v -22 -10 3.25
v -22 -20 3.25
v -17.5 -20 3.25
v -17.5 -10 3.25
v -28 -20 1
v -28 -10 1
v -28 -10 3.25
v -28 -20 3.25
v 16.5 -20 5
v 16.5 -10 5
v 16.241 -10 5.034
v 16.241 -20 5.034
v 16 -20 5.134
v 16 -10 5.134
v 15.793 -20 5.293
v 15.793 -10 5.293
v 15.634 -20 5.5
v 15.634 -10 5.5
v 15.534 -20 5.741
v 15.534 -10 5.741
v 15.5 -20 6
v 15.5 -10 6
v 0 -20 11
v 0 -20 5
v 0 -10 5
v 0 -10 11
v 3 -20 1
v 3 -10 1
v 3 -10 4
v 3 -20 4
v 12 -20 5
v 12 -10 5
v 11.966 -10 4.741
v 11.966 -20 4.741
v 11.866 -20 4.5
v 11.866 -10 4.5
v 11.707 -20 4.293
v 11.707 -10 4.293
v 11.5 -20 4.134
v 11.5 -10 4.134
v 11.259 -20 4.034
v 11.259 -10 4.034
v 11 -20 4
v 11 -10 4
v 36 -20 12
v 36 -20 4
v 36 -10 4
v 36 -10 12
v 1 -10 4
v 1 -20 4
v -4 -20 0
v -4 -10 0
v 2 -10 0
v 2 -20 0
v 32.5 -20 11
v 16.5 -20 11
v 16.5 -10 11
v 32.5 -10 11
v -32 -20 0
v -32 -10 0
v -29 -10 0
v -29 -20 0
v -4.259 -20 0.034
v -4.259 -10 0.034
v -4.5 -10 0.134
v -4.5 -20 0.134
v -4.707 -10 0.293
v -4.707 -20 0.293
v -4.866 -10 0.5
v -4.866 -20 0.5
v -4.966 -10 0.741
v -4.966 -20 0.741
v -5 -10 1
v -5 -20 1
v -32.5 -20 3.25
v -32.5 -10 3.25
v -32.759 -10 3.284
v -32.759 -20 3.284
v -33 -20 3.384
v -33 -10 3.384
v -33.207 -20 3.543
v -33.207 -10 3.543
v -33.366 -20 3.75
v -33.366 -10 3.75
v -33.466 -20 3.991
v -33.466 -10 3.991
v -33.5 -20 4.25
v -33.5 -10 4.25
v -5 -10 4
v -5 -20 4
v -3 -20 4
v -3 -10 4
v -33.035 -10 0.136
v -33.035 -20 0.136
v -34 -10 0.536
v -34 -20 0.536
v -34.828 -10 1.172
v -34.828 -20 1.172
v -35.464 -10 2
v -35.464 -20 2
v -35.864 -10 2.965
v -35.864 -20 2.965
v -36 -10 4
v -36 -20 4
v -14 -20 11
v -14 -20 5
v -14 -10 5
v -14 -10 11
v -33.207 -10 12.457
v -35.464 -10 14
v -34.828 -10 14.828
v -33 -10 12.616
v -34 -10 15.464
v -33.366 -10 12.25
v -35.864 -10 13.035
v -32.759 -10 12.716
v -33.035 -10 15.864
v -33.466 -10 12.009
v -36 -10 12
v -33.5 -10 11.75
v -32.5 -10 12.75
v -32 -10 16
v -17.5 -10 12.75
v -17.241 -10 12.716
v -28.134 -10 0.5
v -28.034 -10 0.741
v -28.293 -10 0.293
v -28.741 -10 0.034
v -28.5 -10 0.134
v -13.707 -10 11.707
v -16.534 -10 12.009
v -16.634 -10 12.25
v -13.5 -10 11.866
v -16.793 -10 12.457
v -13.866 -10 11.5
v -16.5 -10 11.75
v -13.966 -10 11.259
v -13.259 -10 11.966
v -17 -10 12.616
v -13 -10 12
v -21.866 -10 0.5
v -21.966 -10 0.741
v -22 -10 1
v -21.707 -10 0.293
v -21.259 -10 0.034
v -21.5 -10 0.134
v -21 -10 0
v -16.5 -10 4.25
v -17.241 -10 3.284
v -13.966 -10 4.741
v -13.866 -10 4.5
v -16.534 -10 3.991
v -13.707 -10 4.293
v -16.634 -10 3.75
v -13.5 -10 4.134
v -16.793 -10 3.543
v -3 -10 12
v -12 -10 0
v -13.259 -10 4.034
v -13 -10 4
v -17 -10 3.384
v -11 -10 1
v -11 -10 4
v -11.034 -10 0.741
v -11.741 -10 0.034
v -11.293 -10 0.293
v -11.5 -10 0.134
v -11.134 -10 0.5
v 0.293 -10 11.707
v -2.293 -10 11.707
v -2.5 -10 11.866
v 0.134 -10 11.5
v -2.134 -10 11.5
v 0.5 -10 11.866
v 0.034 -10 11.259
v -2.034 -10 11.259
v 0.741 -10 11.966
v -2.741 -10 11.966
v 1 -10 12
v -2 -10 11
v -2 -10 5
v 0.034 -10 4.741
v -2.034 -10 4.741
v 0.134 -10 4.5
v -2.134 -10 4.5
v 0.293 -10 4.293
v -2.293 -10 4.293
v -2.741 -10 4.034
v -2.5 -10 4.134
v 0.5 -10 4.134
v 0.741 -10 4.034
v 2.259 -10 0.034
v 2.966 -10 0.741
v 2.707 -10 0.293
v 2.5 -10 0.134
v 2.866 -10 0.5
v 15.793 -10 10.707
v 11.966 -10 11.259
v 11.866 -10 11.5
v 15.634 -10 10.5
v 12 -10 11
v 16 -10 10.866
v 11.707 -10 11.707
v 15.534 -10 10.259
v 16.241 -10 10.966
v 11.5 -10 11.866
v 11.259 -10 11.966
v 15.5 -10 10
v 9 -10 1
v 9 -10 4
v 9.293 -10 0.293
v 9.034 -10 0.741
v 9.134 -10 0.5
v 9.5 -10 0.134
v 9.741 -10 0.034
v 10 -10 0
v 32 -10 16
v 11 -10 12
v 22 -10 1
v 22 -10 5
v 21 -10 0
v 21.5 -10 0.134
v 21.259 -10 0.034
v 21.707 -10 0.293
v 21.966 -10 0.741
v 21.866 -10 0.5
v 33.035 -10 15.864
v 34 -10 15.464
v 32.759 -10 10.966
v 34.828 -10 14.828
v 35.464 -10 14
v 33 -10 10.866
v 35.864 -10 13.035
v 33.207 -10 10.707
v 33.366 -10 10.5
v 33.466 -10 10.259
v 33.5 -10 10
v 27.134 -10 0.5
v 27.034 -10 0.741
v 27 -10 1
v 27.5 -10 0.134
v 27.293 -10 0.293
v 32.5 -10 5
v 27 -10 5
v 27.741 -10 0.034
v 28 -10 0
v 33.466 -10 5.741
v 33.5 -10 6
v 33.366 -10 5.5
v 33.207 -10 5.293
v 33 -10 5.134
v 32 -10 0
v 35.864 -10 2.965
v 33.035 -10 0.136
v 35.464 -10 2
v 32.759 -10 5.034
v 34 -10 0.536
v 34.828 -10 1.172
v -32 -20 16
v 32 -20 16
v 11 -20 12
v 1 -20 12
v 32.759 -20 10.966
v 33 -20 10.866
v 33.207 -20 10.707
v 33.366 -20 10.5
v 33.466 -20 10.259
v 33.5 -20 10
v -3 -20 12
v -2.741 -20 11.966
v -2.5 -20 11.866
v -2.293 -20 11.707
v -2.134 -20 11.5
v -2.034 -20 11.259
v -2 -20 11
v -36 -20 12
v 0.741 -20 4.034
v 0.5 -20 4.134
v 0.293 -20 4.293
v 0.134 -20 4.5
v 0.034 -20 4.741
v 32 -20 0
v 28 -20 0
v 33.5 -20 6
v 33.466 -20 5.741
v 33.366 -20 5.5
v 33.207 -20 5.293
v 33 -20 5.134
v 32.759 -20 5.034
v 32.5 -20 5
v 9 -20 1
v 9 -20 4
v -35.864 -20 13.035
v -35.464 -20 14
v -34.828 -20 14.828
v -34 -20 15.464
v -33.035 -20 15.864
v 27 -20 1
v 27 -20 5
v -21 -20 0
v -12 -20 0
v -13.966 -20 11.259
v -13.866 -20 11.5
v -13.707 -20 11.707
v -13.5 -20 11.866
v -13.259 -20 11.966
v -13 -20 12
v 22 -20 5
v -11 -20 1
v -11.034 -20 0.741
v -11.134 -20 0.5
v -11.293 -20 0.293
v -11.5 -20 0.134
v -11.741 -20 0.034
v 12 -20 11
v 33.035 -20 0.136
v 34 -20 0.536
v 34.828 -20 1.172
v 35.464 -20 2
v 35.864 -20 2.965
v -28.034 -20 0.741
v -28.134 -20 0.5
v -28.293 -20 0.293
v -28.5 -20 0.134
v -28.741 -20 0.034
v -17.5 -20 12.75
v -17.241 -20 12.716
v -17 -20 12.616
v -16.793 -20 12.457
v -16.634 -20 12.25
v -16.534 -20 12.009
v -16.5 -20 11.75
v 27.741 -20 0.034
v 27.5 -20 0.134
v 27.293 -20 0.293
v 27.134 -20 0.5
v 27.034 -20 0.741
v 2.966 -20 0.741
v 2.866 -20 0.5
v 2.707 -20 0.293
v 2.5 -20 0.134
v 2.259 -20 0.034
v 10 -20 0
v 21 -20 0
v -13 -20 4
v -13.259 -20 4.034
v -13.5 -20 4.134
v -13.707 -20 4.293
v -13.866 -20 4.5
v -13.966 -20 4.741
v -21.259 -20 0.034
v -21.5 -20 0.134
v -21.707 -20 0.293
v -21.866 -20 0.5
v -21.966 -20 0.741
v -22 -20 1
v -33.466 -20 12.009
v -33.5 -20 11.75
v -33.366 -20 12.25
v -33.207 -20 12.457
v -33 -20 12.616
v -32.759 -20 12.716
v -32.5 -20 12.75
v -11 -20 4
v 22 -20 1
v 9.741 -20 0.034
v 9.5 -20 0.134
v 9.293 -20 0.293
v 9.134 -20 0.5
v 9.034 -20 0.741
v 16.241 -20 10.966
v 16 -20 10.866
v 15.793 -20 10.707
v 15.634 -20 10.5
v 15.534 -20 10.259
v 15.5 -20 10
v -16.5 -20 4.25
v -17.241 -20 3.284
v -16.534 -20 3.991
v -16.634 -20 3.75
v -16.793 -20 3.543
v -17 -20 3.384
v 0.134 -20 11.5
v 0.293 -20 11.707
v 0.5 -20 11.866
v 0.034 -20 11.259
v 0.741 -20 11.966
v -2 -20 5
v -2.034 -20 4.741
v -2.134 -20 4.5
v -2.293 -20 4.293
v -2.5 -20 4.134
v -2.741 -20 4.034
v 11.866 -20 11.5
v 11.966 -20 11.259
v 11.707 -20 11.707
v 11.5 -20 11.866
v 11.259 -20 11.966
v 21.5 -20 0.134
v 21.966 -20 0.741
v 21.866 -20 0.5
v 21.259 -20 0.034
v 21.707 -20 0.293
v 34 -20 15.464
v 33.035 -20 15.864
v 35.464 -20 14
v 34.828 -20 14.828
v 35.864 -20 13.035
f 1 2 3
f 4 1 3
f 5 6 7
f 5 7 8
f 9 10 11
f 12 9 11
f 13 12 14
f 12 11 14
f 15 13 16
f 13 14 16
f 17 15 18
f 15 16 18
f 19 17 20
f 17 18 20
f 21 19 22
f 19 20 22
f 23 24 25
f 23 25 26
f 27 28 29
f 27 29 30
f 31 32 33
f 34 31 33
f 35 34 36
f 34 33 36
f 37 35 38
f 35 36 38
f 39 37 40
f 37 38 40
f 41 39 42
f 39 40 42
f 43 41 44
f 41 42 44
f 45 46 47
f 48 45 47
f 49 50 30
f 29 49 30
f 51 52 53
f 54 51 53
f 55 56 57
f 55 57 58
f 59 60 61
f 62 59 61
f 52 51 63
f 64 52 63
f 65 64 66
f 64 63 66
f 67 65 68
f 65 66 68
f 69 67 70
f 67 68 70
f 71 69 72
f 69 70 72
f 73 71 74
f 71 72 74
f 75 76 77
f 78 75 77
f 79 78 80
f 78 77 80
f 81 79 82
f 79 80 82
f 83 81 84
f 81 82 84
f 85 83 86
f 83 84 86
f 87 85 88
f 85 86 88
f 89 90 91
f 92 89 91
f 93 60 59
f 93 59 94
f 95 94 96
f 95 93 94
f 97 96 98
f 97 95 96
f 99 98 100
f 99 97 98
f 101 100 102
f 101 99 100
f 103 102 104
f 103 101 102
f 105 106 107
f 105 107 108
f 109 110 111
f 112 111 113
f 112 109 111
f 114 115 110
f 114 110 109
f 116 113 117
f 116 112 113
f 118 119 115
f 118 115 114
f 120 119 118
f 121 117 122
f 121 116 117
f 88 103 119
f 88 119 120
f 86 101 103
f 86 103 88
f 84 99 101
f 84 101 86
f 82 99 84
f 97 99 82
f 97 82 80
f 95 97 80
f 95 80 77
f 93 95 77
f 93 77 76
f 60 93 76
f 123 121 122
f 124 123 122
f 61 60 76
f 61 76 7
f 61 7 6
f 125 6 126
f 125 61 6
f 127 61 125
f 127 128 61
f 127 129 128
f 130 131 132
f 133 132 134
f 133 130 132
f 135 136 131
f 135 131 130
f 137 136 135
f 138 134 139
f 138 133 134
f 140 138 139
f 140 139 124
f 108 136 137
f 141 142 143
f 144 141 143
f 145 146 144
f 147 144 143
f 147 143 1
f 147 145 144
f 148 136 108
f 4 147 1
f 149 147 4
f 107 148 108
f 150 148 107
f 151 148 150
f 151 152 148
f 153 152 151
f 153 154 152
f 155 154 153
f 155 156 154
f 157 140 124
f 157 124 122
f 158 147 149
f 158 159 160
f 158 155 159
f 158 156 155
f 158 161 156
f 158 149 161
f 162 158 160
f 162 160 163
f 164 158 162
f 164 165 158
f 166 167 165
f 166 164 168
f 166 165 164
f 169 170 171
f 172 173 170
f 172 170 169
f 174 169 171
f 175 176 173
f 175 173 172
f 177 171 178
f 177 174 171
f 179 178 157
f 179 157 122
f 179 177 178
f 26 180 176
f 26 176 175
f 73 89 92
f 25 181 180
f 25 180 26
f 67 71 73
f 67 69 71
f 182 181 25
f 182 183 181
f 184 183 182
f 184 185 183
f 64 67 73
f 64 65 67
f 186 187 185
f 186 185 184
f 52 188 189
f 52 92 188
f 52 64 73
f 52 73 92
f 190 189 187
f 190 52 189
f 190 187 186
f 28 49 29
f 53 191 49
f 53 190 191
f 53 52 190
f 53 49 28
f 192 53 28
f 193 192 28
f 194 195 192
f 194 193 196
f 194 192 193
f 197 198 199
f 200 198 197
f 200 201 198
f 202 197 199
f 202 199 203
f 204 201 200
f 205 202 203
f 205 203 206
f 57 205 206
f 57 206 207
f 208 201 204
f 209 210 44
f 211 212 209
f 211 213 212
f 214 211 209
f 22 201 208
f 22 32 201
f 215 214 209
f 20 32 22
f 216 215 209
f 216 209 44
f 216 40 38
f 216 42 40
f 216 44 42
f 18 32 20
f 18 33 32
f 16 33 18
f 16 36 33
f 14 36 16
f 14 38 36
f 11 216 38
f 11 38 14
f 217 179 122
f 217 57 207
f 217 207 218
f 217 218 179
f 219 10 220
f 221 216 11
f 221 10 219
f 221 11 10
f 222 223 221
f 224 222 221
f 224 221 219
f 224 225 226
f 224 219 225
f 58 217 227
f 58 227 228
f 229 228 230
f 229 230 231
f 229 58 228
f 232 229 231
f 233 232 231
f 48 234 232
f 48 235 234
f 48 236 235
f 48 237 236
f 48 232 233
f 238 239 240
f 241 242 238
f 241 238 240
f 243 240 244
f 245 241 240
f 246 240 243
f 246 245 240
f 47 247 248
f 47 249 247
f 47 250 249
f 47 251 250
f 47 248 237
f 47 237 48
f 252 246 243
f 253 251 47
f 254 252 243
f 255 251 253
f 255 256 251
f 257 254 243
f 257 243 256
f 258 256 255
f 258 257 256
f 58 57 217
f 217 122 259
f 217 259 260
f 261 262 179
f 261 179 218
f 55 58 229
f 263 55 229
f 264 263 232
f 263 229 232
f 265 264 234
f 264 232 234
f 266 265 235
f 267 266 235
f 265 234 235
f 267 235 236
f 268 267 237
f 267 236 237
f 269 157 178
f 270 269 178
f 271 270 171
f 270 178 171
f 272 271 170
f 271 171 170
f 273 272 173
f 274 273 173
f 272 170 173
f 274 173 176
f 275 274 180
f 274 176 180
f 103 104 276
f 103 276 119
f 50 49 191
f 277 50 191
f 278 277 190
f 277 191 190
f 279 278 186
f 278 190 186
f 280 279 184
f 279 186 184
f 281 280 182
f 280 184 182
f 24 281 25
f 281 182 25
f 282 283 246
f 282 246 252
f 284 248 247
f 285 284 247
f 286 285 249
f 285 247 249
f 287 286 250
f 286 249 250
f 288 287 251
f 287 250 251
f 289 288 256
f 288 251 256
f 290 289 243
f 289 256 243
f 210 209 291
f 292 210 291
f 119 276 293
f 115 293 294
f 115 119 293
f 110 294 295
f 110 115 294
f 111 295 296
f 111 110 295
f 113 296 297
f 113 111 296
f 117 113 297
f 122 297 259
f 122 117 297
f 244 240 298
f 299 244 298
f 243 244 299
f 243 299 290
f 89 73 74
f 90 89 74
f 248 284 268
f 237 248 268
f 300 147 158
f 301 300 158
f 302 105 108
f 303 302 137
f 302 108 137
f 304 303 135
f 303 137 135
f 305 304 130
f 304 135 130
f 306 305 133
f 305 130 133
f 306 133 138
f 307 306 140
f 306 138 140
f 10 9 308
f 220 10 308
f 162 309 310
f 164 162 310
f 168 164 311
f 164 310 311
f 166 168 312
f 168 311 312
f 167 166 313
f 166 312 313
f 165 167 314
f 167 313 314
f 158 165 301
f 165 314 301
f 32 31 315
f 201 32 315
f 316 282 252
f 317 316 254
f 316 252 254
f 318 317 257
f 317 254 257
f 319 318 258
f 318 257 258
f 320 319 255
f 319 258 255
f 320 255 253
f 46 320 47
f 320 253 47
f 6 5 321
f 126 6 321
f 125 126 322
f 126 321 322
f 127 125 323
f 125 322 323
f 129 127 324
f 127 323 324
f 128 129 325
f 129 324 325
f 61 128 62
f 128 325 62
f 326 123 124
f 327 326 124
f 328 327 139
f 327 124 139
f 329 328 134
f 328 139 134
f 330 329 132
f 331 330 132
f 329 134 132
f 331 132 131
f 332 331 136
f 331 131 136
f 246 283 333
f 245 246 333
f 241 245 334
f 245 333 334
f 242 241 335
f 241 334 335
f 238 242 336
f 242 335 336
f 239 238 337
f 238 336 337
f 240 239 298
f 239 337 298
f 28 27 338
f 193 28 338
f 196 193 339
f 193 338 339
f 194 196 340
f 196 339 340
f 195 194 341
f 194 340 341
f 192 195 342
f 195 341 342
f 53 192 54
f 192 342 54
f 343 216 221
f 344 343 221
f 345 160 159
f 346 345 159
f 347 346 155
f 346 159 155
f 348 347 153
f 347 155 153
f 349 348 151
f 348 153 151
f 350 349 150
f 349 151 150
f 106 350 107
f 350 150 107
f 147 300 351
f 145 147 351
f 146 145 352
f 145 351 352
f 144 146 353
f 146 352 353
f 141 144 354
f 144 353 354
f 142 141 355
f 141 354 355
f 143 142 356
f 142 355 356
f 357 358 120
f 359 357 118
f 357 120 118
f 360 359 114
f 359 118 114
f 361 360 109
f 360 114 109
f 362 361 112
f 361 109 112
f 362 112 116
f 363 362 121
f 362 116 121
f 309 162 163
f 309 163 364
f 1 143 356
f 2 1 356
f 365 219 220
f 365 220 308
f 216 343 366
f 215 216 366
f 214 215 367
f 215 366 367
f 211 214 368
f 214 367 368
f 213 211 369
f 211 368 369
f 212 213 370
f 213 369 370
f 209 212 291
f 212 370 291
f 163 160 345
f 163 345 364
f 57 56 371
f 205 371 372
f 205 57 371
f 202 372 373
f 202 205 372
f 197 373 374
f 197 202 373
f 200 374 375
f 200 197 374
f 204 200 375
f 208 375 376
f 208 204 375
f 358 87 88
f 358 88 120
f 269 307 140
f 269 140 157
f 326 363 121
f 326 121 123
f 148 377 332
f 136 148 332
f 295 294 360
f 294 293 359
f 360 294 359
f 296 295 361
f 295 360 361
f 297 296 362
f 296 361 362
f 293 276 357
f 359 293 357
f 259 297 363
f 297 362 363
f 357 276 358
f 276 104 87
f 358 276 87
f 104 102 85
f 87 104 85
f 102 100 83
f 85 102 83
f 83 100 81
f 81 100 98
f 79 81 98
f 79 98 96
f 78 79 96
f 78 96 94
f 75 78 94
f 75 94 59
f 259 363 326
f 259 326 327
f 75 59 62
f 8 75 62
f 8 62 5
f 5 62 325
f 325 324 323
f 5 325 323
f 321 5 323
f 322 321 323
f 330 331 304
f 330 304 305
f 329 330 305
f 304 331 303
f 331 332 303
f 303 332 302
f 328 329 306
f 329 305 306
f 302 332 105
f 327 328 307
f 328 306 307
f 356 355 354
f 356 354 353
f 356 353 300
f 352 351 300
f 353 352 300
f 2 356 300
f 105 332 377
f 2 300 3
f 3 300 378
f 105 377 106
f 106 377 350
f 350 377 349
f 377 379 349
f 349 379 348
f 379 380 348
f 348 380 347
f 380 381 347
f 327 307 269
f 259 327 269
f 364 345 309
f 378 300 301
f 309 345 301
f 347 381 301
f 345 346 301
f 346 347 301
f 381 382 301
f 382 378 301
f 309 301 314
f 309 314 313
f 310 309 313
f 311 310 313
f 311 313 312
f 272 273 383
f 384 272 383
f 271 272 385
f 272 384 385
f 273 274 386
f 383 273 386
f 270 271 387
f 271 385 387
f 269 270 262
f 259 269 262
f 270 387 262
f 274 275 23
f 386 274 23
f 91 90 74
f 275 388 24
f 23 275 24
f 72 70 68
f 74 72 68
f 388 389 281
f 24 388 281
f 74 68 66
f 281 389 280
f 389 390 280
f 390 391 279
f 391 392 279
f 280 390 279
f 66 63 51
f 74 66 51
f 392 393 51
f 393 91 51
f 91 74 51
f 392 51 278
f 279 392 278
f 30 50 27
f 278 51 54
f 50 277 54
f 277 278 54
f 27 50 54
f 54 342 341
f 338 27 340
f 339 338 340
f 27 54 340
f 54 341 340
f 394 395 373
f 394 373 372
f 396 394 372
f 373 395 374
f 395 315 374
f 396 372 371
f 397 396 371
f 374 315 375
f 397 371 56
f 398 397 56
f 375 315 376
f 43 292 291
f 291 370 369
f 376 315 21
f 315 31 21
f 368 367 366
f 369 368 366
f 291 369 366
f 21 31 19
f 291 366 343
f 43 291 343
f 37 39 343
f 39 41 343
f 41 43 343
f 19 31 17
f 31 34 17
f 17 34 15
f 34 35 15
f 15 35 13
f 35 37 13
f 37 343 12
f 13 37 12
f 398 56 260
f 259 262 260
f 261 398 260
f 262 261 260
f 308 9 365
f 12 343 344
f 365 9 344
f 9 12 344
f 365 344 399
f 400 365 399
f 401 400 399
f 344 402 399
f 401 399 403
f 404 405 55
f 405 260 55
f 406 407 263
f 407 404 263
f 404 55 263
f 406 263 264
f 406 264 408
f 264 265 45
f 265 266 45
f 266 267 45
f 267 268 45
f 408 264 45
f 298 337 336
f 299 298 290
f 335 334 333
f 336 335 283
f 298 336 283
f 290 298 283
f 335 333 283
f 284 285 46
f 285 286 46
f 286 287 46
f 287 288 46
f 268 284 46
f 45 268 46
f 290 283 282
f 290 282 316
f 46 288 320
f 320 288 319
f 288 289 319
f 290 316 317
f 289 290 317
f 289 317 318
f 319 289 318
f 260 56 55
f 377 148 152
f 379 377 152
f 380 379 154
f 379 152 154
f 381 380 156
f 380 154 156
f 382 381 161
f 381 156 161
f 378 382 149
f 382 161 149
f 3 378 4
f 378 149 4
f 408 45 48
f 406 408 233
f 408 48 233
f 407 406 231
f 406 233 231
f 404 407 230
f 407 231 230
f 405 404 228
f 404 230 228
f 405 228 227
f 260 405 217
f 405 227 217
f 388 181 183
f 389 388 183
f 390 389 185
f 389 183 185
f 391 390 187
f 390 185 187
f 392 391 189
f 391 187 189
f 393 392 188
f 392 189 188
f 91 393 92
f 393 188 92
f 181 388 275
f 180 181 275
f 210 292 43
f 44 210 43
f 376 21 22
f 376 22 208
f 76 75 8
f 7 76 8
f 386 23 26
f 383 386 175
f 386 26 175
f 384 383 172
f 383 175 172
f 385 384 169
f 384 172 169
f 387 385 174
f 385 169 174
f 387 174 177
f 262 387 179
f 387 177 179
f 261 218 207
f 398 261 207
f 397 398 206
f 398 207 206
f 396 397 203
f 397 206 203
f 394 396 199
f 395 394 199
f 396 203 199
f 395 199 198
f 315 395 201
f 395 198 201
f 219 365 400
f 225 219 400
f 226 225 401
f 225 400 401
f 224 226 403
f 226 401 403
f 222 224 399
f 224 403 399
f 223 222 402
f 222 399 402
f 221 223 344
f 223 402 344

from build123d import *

# Parameters (mm, degrees)
F0_W      = 72
F0_H      = 40
F1_DEPTH  = 16
F3_W      = 17
F3_H      = 9.5
F7_DEPTH  = 35
F4_W      = 12
F4_H      = 8
F8_DEPTH  = 20
F5_W      = 12
F5_H      = 8
F9_DEPTH  = 28
F6_W      = 18
F6_H      = 6
F10_DEPTH = 11
F11_R     = 3.25
F11_R_2   = 3
F12_DEPTH = 40.001
F13_W     = 6
F13_H     = 40
F13_W_2   = 5
F14_DEPTH = 8
F15_R     = 1
F16_R     = 4
F17_W     = 72
F17_H     = 10
F18_DEPTH = 16.001


with BuildPart() as f1:
    # F0 (on Top) → F1 (new body)
    with BuildSketch(Plane.XY):
        Rectangle(F0_W, F0_H)
    extrude(amount=F1_DEPTH)

    # F3 (on face) → F7 (cut)
    with BuildSketch(Plane.XZ.offset(20)):
        with Locations((-25, 8)):
            Rectangle(F3_W, F3_H)
    extrude(amount=-F7_DEPTH, mode=Mode.SUBTRACT)

    # F4 (on face) → F8 (cut)
    with BuildSketch(Plane.XZ.offset(20)):
        with Locations((-8, 8)):
            Rectangle(F4_W, F4_H)
    extrude(amount=-F8_DEPTH, mode=Mode.SUBTRACT)

    # F5 (on face) → F9 (cut)
    with BuildSketch(Plane.XZ.offset(20)):
        with Locations((6, 8)):
            Rectangle(F5_W, F5_H)
    extrude(amount=-F9_DEPTH, mode=Mode.SUBTRACT)

    # F6 (on face) → F10 (cut)
    with BuildSketch(Plane.XZ.offset(20)):
        with Locations((24.5, 8)):
            Rectangle(F6_W, F6_H)
    extrude(amount=-F10_DEPTH, mode=Mode.SUBTRACT)

    # F11 (on face) → F12 (cut, through all)
    with BuildSketch(Plane.XZ.offset(20)):
        with Locations((-25, 8)):
            Circle(F11_R)
        with Locations((-8, 8)):
            Circle(F11_R)
        with Locations((6, 8)):
            Circle(F11_R)
        with Locations((24.5, 8)):
            Circle(F11_R_2)
    extrude(amount=-F12_DEPTH, mode=Mode.SUBTRACT)

    # F13 (on face) → F14 (cut)
    with BuildSketch(Plane(origin=(0, 0, 0), x_dir=(1, 0, 0), z_dir=(0, 0, -1))):
        with Locations((-25, 0)):
            Rectangle(F13_W, F13_H)
        with Locations((-8, 0)):
            Rectangle(F13_W, F13_H)
        with Locations((6, 0)):
            Rectangle(F13_W, F13_H)
        with Locations((24.5, 0)):
            Rectangle(F13_W_2, F13_H)
    extrude(amount=-F14_DEPTH, mode=Mode.SUBTRACT)

    # F15
    f15_edges = [f1.edges().sort_by_distance(p)[0] for p in [
        (33.5, -14.5, 5),
        (33.5, -14.5, 11),
        (12, -6, 12),
        (-2, -10, 12),
        (-16.5, -2.5, 12.75),
        (-33.5, -2.5, 3.25),
        (-14, -10, 4),
        (0, -6, 4),
        (15.5, -14.5, 5),
        (15.5, -14.5, 11),
        (0, -6, 12),
        (-14, -10, 12),
        (-33.5, -2.5, 12.75),
        (12, -6, 4),
        (-2, -10, 4),
        (-16.5, -2.5, 3.25),
        (22, 0, 0),
        (27, 0, 0),
        (3, 0, 0),
        (9, 0, 0),
        (-11, 0, 0),
        (-5, 0, 0),
        (-28, 0, 0),
        (-22, 0, 0),
    ]]
    fillet(f15_edges, radius=F15_R)

    # F16
    f16_edges = [f1.edges().sort_by_distance(p)[0] for p in [
        (36, 0, 0),
        (36, 0, 16),
        (-36, 0, 0),
        (-36, 0, 16),
    ]]
    fillet(f16_edges, radius=F16_R)

    # F17 (on Top) → F18 (intersect, through all)
    with BuildSketch(Plane.XY):
        with Locations((0, -15)):
            Rectangle(F17_W, F17_H)
    extrude(amount=F18_DEPTH, mode=Mode.INTERSECT)


solid = f1.part
